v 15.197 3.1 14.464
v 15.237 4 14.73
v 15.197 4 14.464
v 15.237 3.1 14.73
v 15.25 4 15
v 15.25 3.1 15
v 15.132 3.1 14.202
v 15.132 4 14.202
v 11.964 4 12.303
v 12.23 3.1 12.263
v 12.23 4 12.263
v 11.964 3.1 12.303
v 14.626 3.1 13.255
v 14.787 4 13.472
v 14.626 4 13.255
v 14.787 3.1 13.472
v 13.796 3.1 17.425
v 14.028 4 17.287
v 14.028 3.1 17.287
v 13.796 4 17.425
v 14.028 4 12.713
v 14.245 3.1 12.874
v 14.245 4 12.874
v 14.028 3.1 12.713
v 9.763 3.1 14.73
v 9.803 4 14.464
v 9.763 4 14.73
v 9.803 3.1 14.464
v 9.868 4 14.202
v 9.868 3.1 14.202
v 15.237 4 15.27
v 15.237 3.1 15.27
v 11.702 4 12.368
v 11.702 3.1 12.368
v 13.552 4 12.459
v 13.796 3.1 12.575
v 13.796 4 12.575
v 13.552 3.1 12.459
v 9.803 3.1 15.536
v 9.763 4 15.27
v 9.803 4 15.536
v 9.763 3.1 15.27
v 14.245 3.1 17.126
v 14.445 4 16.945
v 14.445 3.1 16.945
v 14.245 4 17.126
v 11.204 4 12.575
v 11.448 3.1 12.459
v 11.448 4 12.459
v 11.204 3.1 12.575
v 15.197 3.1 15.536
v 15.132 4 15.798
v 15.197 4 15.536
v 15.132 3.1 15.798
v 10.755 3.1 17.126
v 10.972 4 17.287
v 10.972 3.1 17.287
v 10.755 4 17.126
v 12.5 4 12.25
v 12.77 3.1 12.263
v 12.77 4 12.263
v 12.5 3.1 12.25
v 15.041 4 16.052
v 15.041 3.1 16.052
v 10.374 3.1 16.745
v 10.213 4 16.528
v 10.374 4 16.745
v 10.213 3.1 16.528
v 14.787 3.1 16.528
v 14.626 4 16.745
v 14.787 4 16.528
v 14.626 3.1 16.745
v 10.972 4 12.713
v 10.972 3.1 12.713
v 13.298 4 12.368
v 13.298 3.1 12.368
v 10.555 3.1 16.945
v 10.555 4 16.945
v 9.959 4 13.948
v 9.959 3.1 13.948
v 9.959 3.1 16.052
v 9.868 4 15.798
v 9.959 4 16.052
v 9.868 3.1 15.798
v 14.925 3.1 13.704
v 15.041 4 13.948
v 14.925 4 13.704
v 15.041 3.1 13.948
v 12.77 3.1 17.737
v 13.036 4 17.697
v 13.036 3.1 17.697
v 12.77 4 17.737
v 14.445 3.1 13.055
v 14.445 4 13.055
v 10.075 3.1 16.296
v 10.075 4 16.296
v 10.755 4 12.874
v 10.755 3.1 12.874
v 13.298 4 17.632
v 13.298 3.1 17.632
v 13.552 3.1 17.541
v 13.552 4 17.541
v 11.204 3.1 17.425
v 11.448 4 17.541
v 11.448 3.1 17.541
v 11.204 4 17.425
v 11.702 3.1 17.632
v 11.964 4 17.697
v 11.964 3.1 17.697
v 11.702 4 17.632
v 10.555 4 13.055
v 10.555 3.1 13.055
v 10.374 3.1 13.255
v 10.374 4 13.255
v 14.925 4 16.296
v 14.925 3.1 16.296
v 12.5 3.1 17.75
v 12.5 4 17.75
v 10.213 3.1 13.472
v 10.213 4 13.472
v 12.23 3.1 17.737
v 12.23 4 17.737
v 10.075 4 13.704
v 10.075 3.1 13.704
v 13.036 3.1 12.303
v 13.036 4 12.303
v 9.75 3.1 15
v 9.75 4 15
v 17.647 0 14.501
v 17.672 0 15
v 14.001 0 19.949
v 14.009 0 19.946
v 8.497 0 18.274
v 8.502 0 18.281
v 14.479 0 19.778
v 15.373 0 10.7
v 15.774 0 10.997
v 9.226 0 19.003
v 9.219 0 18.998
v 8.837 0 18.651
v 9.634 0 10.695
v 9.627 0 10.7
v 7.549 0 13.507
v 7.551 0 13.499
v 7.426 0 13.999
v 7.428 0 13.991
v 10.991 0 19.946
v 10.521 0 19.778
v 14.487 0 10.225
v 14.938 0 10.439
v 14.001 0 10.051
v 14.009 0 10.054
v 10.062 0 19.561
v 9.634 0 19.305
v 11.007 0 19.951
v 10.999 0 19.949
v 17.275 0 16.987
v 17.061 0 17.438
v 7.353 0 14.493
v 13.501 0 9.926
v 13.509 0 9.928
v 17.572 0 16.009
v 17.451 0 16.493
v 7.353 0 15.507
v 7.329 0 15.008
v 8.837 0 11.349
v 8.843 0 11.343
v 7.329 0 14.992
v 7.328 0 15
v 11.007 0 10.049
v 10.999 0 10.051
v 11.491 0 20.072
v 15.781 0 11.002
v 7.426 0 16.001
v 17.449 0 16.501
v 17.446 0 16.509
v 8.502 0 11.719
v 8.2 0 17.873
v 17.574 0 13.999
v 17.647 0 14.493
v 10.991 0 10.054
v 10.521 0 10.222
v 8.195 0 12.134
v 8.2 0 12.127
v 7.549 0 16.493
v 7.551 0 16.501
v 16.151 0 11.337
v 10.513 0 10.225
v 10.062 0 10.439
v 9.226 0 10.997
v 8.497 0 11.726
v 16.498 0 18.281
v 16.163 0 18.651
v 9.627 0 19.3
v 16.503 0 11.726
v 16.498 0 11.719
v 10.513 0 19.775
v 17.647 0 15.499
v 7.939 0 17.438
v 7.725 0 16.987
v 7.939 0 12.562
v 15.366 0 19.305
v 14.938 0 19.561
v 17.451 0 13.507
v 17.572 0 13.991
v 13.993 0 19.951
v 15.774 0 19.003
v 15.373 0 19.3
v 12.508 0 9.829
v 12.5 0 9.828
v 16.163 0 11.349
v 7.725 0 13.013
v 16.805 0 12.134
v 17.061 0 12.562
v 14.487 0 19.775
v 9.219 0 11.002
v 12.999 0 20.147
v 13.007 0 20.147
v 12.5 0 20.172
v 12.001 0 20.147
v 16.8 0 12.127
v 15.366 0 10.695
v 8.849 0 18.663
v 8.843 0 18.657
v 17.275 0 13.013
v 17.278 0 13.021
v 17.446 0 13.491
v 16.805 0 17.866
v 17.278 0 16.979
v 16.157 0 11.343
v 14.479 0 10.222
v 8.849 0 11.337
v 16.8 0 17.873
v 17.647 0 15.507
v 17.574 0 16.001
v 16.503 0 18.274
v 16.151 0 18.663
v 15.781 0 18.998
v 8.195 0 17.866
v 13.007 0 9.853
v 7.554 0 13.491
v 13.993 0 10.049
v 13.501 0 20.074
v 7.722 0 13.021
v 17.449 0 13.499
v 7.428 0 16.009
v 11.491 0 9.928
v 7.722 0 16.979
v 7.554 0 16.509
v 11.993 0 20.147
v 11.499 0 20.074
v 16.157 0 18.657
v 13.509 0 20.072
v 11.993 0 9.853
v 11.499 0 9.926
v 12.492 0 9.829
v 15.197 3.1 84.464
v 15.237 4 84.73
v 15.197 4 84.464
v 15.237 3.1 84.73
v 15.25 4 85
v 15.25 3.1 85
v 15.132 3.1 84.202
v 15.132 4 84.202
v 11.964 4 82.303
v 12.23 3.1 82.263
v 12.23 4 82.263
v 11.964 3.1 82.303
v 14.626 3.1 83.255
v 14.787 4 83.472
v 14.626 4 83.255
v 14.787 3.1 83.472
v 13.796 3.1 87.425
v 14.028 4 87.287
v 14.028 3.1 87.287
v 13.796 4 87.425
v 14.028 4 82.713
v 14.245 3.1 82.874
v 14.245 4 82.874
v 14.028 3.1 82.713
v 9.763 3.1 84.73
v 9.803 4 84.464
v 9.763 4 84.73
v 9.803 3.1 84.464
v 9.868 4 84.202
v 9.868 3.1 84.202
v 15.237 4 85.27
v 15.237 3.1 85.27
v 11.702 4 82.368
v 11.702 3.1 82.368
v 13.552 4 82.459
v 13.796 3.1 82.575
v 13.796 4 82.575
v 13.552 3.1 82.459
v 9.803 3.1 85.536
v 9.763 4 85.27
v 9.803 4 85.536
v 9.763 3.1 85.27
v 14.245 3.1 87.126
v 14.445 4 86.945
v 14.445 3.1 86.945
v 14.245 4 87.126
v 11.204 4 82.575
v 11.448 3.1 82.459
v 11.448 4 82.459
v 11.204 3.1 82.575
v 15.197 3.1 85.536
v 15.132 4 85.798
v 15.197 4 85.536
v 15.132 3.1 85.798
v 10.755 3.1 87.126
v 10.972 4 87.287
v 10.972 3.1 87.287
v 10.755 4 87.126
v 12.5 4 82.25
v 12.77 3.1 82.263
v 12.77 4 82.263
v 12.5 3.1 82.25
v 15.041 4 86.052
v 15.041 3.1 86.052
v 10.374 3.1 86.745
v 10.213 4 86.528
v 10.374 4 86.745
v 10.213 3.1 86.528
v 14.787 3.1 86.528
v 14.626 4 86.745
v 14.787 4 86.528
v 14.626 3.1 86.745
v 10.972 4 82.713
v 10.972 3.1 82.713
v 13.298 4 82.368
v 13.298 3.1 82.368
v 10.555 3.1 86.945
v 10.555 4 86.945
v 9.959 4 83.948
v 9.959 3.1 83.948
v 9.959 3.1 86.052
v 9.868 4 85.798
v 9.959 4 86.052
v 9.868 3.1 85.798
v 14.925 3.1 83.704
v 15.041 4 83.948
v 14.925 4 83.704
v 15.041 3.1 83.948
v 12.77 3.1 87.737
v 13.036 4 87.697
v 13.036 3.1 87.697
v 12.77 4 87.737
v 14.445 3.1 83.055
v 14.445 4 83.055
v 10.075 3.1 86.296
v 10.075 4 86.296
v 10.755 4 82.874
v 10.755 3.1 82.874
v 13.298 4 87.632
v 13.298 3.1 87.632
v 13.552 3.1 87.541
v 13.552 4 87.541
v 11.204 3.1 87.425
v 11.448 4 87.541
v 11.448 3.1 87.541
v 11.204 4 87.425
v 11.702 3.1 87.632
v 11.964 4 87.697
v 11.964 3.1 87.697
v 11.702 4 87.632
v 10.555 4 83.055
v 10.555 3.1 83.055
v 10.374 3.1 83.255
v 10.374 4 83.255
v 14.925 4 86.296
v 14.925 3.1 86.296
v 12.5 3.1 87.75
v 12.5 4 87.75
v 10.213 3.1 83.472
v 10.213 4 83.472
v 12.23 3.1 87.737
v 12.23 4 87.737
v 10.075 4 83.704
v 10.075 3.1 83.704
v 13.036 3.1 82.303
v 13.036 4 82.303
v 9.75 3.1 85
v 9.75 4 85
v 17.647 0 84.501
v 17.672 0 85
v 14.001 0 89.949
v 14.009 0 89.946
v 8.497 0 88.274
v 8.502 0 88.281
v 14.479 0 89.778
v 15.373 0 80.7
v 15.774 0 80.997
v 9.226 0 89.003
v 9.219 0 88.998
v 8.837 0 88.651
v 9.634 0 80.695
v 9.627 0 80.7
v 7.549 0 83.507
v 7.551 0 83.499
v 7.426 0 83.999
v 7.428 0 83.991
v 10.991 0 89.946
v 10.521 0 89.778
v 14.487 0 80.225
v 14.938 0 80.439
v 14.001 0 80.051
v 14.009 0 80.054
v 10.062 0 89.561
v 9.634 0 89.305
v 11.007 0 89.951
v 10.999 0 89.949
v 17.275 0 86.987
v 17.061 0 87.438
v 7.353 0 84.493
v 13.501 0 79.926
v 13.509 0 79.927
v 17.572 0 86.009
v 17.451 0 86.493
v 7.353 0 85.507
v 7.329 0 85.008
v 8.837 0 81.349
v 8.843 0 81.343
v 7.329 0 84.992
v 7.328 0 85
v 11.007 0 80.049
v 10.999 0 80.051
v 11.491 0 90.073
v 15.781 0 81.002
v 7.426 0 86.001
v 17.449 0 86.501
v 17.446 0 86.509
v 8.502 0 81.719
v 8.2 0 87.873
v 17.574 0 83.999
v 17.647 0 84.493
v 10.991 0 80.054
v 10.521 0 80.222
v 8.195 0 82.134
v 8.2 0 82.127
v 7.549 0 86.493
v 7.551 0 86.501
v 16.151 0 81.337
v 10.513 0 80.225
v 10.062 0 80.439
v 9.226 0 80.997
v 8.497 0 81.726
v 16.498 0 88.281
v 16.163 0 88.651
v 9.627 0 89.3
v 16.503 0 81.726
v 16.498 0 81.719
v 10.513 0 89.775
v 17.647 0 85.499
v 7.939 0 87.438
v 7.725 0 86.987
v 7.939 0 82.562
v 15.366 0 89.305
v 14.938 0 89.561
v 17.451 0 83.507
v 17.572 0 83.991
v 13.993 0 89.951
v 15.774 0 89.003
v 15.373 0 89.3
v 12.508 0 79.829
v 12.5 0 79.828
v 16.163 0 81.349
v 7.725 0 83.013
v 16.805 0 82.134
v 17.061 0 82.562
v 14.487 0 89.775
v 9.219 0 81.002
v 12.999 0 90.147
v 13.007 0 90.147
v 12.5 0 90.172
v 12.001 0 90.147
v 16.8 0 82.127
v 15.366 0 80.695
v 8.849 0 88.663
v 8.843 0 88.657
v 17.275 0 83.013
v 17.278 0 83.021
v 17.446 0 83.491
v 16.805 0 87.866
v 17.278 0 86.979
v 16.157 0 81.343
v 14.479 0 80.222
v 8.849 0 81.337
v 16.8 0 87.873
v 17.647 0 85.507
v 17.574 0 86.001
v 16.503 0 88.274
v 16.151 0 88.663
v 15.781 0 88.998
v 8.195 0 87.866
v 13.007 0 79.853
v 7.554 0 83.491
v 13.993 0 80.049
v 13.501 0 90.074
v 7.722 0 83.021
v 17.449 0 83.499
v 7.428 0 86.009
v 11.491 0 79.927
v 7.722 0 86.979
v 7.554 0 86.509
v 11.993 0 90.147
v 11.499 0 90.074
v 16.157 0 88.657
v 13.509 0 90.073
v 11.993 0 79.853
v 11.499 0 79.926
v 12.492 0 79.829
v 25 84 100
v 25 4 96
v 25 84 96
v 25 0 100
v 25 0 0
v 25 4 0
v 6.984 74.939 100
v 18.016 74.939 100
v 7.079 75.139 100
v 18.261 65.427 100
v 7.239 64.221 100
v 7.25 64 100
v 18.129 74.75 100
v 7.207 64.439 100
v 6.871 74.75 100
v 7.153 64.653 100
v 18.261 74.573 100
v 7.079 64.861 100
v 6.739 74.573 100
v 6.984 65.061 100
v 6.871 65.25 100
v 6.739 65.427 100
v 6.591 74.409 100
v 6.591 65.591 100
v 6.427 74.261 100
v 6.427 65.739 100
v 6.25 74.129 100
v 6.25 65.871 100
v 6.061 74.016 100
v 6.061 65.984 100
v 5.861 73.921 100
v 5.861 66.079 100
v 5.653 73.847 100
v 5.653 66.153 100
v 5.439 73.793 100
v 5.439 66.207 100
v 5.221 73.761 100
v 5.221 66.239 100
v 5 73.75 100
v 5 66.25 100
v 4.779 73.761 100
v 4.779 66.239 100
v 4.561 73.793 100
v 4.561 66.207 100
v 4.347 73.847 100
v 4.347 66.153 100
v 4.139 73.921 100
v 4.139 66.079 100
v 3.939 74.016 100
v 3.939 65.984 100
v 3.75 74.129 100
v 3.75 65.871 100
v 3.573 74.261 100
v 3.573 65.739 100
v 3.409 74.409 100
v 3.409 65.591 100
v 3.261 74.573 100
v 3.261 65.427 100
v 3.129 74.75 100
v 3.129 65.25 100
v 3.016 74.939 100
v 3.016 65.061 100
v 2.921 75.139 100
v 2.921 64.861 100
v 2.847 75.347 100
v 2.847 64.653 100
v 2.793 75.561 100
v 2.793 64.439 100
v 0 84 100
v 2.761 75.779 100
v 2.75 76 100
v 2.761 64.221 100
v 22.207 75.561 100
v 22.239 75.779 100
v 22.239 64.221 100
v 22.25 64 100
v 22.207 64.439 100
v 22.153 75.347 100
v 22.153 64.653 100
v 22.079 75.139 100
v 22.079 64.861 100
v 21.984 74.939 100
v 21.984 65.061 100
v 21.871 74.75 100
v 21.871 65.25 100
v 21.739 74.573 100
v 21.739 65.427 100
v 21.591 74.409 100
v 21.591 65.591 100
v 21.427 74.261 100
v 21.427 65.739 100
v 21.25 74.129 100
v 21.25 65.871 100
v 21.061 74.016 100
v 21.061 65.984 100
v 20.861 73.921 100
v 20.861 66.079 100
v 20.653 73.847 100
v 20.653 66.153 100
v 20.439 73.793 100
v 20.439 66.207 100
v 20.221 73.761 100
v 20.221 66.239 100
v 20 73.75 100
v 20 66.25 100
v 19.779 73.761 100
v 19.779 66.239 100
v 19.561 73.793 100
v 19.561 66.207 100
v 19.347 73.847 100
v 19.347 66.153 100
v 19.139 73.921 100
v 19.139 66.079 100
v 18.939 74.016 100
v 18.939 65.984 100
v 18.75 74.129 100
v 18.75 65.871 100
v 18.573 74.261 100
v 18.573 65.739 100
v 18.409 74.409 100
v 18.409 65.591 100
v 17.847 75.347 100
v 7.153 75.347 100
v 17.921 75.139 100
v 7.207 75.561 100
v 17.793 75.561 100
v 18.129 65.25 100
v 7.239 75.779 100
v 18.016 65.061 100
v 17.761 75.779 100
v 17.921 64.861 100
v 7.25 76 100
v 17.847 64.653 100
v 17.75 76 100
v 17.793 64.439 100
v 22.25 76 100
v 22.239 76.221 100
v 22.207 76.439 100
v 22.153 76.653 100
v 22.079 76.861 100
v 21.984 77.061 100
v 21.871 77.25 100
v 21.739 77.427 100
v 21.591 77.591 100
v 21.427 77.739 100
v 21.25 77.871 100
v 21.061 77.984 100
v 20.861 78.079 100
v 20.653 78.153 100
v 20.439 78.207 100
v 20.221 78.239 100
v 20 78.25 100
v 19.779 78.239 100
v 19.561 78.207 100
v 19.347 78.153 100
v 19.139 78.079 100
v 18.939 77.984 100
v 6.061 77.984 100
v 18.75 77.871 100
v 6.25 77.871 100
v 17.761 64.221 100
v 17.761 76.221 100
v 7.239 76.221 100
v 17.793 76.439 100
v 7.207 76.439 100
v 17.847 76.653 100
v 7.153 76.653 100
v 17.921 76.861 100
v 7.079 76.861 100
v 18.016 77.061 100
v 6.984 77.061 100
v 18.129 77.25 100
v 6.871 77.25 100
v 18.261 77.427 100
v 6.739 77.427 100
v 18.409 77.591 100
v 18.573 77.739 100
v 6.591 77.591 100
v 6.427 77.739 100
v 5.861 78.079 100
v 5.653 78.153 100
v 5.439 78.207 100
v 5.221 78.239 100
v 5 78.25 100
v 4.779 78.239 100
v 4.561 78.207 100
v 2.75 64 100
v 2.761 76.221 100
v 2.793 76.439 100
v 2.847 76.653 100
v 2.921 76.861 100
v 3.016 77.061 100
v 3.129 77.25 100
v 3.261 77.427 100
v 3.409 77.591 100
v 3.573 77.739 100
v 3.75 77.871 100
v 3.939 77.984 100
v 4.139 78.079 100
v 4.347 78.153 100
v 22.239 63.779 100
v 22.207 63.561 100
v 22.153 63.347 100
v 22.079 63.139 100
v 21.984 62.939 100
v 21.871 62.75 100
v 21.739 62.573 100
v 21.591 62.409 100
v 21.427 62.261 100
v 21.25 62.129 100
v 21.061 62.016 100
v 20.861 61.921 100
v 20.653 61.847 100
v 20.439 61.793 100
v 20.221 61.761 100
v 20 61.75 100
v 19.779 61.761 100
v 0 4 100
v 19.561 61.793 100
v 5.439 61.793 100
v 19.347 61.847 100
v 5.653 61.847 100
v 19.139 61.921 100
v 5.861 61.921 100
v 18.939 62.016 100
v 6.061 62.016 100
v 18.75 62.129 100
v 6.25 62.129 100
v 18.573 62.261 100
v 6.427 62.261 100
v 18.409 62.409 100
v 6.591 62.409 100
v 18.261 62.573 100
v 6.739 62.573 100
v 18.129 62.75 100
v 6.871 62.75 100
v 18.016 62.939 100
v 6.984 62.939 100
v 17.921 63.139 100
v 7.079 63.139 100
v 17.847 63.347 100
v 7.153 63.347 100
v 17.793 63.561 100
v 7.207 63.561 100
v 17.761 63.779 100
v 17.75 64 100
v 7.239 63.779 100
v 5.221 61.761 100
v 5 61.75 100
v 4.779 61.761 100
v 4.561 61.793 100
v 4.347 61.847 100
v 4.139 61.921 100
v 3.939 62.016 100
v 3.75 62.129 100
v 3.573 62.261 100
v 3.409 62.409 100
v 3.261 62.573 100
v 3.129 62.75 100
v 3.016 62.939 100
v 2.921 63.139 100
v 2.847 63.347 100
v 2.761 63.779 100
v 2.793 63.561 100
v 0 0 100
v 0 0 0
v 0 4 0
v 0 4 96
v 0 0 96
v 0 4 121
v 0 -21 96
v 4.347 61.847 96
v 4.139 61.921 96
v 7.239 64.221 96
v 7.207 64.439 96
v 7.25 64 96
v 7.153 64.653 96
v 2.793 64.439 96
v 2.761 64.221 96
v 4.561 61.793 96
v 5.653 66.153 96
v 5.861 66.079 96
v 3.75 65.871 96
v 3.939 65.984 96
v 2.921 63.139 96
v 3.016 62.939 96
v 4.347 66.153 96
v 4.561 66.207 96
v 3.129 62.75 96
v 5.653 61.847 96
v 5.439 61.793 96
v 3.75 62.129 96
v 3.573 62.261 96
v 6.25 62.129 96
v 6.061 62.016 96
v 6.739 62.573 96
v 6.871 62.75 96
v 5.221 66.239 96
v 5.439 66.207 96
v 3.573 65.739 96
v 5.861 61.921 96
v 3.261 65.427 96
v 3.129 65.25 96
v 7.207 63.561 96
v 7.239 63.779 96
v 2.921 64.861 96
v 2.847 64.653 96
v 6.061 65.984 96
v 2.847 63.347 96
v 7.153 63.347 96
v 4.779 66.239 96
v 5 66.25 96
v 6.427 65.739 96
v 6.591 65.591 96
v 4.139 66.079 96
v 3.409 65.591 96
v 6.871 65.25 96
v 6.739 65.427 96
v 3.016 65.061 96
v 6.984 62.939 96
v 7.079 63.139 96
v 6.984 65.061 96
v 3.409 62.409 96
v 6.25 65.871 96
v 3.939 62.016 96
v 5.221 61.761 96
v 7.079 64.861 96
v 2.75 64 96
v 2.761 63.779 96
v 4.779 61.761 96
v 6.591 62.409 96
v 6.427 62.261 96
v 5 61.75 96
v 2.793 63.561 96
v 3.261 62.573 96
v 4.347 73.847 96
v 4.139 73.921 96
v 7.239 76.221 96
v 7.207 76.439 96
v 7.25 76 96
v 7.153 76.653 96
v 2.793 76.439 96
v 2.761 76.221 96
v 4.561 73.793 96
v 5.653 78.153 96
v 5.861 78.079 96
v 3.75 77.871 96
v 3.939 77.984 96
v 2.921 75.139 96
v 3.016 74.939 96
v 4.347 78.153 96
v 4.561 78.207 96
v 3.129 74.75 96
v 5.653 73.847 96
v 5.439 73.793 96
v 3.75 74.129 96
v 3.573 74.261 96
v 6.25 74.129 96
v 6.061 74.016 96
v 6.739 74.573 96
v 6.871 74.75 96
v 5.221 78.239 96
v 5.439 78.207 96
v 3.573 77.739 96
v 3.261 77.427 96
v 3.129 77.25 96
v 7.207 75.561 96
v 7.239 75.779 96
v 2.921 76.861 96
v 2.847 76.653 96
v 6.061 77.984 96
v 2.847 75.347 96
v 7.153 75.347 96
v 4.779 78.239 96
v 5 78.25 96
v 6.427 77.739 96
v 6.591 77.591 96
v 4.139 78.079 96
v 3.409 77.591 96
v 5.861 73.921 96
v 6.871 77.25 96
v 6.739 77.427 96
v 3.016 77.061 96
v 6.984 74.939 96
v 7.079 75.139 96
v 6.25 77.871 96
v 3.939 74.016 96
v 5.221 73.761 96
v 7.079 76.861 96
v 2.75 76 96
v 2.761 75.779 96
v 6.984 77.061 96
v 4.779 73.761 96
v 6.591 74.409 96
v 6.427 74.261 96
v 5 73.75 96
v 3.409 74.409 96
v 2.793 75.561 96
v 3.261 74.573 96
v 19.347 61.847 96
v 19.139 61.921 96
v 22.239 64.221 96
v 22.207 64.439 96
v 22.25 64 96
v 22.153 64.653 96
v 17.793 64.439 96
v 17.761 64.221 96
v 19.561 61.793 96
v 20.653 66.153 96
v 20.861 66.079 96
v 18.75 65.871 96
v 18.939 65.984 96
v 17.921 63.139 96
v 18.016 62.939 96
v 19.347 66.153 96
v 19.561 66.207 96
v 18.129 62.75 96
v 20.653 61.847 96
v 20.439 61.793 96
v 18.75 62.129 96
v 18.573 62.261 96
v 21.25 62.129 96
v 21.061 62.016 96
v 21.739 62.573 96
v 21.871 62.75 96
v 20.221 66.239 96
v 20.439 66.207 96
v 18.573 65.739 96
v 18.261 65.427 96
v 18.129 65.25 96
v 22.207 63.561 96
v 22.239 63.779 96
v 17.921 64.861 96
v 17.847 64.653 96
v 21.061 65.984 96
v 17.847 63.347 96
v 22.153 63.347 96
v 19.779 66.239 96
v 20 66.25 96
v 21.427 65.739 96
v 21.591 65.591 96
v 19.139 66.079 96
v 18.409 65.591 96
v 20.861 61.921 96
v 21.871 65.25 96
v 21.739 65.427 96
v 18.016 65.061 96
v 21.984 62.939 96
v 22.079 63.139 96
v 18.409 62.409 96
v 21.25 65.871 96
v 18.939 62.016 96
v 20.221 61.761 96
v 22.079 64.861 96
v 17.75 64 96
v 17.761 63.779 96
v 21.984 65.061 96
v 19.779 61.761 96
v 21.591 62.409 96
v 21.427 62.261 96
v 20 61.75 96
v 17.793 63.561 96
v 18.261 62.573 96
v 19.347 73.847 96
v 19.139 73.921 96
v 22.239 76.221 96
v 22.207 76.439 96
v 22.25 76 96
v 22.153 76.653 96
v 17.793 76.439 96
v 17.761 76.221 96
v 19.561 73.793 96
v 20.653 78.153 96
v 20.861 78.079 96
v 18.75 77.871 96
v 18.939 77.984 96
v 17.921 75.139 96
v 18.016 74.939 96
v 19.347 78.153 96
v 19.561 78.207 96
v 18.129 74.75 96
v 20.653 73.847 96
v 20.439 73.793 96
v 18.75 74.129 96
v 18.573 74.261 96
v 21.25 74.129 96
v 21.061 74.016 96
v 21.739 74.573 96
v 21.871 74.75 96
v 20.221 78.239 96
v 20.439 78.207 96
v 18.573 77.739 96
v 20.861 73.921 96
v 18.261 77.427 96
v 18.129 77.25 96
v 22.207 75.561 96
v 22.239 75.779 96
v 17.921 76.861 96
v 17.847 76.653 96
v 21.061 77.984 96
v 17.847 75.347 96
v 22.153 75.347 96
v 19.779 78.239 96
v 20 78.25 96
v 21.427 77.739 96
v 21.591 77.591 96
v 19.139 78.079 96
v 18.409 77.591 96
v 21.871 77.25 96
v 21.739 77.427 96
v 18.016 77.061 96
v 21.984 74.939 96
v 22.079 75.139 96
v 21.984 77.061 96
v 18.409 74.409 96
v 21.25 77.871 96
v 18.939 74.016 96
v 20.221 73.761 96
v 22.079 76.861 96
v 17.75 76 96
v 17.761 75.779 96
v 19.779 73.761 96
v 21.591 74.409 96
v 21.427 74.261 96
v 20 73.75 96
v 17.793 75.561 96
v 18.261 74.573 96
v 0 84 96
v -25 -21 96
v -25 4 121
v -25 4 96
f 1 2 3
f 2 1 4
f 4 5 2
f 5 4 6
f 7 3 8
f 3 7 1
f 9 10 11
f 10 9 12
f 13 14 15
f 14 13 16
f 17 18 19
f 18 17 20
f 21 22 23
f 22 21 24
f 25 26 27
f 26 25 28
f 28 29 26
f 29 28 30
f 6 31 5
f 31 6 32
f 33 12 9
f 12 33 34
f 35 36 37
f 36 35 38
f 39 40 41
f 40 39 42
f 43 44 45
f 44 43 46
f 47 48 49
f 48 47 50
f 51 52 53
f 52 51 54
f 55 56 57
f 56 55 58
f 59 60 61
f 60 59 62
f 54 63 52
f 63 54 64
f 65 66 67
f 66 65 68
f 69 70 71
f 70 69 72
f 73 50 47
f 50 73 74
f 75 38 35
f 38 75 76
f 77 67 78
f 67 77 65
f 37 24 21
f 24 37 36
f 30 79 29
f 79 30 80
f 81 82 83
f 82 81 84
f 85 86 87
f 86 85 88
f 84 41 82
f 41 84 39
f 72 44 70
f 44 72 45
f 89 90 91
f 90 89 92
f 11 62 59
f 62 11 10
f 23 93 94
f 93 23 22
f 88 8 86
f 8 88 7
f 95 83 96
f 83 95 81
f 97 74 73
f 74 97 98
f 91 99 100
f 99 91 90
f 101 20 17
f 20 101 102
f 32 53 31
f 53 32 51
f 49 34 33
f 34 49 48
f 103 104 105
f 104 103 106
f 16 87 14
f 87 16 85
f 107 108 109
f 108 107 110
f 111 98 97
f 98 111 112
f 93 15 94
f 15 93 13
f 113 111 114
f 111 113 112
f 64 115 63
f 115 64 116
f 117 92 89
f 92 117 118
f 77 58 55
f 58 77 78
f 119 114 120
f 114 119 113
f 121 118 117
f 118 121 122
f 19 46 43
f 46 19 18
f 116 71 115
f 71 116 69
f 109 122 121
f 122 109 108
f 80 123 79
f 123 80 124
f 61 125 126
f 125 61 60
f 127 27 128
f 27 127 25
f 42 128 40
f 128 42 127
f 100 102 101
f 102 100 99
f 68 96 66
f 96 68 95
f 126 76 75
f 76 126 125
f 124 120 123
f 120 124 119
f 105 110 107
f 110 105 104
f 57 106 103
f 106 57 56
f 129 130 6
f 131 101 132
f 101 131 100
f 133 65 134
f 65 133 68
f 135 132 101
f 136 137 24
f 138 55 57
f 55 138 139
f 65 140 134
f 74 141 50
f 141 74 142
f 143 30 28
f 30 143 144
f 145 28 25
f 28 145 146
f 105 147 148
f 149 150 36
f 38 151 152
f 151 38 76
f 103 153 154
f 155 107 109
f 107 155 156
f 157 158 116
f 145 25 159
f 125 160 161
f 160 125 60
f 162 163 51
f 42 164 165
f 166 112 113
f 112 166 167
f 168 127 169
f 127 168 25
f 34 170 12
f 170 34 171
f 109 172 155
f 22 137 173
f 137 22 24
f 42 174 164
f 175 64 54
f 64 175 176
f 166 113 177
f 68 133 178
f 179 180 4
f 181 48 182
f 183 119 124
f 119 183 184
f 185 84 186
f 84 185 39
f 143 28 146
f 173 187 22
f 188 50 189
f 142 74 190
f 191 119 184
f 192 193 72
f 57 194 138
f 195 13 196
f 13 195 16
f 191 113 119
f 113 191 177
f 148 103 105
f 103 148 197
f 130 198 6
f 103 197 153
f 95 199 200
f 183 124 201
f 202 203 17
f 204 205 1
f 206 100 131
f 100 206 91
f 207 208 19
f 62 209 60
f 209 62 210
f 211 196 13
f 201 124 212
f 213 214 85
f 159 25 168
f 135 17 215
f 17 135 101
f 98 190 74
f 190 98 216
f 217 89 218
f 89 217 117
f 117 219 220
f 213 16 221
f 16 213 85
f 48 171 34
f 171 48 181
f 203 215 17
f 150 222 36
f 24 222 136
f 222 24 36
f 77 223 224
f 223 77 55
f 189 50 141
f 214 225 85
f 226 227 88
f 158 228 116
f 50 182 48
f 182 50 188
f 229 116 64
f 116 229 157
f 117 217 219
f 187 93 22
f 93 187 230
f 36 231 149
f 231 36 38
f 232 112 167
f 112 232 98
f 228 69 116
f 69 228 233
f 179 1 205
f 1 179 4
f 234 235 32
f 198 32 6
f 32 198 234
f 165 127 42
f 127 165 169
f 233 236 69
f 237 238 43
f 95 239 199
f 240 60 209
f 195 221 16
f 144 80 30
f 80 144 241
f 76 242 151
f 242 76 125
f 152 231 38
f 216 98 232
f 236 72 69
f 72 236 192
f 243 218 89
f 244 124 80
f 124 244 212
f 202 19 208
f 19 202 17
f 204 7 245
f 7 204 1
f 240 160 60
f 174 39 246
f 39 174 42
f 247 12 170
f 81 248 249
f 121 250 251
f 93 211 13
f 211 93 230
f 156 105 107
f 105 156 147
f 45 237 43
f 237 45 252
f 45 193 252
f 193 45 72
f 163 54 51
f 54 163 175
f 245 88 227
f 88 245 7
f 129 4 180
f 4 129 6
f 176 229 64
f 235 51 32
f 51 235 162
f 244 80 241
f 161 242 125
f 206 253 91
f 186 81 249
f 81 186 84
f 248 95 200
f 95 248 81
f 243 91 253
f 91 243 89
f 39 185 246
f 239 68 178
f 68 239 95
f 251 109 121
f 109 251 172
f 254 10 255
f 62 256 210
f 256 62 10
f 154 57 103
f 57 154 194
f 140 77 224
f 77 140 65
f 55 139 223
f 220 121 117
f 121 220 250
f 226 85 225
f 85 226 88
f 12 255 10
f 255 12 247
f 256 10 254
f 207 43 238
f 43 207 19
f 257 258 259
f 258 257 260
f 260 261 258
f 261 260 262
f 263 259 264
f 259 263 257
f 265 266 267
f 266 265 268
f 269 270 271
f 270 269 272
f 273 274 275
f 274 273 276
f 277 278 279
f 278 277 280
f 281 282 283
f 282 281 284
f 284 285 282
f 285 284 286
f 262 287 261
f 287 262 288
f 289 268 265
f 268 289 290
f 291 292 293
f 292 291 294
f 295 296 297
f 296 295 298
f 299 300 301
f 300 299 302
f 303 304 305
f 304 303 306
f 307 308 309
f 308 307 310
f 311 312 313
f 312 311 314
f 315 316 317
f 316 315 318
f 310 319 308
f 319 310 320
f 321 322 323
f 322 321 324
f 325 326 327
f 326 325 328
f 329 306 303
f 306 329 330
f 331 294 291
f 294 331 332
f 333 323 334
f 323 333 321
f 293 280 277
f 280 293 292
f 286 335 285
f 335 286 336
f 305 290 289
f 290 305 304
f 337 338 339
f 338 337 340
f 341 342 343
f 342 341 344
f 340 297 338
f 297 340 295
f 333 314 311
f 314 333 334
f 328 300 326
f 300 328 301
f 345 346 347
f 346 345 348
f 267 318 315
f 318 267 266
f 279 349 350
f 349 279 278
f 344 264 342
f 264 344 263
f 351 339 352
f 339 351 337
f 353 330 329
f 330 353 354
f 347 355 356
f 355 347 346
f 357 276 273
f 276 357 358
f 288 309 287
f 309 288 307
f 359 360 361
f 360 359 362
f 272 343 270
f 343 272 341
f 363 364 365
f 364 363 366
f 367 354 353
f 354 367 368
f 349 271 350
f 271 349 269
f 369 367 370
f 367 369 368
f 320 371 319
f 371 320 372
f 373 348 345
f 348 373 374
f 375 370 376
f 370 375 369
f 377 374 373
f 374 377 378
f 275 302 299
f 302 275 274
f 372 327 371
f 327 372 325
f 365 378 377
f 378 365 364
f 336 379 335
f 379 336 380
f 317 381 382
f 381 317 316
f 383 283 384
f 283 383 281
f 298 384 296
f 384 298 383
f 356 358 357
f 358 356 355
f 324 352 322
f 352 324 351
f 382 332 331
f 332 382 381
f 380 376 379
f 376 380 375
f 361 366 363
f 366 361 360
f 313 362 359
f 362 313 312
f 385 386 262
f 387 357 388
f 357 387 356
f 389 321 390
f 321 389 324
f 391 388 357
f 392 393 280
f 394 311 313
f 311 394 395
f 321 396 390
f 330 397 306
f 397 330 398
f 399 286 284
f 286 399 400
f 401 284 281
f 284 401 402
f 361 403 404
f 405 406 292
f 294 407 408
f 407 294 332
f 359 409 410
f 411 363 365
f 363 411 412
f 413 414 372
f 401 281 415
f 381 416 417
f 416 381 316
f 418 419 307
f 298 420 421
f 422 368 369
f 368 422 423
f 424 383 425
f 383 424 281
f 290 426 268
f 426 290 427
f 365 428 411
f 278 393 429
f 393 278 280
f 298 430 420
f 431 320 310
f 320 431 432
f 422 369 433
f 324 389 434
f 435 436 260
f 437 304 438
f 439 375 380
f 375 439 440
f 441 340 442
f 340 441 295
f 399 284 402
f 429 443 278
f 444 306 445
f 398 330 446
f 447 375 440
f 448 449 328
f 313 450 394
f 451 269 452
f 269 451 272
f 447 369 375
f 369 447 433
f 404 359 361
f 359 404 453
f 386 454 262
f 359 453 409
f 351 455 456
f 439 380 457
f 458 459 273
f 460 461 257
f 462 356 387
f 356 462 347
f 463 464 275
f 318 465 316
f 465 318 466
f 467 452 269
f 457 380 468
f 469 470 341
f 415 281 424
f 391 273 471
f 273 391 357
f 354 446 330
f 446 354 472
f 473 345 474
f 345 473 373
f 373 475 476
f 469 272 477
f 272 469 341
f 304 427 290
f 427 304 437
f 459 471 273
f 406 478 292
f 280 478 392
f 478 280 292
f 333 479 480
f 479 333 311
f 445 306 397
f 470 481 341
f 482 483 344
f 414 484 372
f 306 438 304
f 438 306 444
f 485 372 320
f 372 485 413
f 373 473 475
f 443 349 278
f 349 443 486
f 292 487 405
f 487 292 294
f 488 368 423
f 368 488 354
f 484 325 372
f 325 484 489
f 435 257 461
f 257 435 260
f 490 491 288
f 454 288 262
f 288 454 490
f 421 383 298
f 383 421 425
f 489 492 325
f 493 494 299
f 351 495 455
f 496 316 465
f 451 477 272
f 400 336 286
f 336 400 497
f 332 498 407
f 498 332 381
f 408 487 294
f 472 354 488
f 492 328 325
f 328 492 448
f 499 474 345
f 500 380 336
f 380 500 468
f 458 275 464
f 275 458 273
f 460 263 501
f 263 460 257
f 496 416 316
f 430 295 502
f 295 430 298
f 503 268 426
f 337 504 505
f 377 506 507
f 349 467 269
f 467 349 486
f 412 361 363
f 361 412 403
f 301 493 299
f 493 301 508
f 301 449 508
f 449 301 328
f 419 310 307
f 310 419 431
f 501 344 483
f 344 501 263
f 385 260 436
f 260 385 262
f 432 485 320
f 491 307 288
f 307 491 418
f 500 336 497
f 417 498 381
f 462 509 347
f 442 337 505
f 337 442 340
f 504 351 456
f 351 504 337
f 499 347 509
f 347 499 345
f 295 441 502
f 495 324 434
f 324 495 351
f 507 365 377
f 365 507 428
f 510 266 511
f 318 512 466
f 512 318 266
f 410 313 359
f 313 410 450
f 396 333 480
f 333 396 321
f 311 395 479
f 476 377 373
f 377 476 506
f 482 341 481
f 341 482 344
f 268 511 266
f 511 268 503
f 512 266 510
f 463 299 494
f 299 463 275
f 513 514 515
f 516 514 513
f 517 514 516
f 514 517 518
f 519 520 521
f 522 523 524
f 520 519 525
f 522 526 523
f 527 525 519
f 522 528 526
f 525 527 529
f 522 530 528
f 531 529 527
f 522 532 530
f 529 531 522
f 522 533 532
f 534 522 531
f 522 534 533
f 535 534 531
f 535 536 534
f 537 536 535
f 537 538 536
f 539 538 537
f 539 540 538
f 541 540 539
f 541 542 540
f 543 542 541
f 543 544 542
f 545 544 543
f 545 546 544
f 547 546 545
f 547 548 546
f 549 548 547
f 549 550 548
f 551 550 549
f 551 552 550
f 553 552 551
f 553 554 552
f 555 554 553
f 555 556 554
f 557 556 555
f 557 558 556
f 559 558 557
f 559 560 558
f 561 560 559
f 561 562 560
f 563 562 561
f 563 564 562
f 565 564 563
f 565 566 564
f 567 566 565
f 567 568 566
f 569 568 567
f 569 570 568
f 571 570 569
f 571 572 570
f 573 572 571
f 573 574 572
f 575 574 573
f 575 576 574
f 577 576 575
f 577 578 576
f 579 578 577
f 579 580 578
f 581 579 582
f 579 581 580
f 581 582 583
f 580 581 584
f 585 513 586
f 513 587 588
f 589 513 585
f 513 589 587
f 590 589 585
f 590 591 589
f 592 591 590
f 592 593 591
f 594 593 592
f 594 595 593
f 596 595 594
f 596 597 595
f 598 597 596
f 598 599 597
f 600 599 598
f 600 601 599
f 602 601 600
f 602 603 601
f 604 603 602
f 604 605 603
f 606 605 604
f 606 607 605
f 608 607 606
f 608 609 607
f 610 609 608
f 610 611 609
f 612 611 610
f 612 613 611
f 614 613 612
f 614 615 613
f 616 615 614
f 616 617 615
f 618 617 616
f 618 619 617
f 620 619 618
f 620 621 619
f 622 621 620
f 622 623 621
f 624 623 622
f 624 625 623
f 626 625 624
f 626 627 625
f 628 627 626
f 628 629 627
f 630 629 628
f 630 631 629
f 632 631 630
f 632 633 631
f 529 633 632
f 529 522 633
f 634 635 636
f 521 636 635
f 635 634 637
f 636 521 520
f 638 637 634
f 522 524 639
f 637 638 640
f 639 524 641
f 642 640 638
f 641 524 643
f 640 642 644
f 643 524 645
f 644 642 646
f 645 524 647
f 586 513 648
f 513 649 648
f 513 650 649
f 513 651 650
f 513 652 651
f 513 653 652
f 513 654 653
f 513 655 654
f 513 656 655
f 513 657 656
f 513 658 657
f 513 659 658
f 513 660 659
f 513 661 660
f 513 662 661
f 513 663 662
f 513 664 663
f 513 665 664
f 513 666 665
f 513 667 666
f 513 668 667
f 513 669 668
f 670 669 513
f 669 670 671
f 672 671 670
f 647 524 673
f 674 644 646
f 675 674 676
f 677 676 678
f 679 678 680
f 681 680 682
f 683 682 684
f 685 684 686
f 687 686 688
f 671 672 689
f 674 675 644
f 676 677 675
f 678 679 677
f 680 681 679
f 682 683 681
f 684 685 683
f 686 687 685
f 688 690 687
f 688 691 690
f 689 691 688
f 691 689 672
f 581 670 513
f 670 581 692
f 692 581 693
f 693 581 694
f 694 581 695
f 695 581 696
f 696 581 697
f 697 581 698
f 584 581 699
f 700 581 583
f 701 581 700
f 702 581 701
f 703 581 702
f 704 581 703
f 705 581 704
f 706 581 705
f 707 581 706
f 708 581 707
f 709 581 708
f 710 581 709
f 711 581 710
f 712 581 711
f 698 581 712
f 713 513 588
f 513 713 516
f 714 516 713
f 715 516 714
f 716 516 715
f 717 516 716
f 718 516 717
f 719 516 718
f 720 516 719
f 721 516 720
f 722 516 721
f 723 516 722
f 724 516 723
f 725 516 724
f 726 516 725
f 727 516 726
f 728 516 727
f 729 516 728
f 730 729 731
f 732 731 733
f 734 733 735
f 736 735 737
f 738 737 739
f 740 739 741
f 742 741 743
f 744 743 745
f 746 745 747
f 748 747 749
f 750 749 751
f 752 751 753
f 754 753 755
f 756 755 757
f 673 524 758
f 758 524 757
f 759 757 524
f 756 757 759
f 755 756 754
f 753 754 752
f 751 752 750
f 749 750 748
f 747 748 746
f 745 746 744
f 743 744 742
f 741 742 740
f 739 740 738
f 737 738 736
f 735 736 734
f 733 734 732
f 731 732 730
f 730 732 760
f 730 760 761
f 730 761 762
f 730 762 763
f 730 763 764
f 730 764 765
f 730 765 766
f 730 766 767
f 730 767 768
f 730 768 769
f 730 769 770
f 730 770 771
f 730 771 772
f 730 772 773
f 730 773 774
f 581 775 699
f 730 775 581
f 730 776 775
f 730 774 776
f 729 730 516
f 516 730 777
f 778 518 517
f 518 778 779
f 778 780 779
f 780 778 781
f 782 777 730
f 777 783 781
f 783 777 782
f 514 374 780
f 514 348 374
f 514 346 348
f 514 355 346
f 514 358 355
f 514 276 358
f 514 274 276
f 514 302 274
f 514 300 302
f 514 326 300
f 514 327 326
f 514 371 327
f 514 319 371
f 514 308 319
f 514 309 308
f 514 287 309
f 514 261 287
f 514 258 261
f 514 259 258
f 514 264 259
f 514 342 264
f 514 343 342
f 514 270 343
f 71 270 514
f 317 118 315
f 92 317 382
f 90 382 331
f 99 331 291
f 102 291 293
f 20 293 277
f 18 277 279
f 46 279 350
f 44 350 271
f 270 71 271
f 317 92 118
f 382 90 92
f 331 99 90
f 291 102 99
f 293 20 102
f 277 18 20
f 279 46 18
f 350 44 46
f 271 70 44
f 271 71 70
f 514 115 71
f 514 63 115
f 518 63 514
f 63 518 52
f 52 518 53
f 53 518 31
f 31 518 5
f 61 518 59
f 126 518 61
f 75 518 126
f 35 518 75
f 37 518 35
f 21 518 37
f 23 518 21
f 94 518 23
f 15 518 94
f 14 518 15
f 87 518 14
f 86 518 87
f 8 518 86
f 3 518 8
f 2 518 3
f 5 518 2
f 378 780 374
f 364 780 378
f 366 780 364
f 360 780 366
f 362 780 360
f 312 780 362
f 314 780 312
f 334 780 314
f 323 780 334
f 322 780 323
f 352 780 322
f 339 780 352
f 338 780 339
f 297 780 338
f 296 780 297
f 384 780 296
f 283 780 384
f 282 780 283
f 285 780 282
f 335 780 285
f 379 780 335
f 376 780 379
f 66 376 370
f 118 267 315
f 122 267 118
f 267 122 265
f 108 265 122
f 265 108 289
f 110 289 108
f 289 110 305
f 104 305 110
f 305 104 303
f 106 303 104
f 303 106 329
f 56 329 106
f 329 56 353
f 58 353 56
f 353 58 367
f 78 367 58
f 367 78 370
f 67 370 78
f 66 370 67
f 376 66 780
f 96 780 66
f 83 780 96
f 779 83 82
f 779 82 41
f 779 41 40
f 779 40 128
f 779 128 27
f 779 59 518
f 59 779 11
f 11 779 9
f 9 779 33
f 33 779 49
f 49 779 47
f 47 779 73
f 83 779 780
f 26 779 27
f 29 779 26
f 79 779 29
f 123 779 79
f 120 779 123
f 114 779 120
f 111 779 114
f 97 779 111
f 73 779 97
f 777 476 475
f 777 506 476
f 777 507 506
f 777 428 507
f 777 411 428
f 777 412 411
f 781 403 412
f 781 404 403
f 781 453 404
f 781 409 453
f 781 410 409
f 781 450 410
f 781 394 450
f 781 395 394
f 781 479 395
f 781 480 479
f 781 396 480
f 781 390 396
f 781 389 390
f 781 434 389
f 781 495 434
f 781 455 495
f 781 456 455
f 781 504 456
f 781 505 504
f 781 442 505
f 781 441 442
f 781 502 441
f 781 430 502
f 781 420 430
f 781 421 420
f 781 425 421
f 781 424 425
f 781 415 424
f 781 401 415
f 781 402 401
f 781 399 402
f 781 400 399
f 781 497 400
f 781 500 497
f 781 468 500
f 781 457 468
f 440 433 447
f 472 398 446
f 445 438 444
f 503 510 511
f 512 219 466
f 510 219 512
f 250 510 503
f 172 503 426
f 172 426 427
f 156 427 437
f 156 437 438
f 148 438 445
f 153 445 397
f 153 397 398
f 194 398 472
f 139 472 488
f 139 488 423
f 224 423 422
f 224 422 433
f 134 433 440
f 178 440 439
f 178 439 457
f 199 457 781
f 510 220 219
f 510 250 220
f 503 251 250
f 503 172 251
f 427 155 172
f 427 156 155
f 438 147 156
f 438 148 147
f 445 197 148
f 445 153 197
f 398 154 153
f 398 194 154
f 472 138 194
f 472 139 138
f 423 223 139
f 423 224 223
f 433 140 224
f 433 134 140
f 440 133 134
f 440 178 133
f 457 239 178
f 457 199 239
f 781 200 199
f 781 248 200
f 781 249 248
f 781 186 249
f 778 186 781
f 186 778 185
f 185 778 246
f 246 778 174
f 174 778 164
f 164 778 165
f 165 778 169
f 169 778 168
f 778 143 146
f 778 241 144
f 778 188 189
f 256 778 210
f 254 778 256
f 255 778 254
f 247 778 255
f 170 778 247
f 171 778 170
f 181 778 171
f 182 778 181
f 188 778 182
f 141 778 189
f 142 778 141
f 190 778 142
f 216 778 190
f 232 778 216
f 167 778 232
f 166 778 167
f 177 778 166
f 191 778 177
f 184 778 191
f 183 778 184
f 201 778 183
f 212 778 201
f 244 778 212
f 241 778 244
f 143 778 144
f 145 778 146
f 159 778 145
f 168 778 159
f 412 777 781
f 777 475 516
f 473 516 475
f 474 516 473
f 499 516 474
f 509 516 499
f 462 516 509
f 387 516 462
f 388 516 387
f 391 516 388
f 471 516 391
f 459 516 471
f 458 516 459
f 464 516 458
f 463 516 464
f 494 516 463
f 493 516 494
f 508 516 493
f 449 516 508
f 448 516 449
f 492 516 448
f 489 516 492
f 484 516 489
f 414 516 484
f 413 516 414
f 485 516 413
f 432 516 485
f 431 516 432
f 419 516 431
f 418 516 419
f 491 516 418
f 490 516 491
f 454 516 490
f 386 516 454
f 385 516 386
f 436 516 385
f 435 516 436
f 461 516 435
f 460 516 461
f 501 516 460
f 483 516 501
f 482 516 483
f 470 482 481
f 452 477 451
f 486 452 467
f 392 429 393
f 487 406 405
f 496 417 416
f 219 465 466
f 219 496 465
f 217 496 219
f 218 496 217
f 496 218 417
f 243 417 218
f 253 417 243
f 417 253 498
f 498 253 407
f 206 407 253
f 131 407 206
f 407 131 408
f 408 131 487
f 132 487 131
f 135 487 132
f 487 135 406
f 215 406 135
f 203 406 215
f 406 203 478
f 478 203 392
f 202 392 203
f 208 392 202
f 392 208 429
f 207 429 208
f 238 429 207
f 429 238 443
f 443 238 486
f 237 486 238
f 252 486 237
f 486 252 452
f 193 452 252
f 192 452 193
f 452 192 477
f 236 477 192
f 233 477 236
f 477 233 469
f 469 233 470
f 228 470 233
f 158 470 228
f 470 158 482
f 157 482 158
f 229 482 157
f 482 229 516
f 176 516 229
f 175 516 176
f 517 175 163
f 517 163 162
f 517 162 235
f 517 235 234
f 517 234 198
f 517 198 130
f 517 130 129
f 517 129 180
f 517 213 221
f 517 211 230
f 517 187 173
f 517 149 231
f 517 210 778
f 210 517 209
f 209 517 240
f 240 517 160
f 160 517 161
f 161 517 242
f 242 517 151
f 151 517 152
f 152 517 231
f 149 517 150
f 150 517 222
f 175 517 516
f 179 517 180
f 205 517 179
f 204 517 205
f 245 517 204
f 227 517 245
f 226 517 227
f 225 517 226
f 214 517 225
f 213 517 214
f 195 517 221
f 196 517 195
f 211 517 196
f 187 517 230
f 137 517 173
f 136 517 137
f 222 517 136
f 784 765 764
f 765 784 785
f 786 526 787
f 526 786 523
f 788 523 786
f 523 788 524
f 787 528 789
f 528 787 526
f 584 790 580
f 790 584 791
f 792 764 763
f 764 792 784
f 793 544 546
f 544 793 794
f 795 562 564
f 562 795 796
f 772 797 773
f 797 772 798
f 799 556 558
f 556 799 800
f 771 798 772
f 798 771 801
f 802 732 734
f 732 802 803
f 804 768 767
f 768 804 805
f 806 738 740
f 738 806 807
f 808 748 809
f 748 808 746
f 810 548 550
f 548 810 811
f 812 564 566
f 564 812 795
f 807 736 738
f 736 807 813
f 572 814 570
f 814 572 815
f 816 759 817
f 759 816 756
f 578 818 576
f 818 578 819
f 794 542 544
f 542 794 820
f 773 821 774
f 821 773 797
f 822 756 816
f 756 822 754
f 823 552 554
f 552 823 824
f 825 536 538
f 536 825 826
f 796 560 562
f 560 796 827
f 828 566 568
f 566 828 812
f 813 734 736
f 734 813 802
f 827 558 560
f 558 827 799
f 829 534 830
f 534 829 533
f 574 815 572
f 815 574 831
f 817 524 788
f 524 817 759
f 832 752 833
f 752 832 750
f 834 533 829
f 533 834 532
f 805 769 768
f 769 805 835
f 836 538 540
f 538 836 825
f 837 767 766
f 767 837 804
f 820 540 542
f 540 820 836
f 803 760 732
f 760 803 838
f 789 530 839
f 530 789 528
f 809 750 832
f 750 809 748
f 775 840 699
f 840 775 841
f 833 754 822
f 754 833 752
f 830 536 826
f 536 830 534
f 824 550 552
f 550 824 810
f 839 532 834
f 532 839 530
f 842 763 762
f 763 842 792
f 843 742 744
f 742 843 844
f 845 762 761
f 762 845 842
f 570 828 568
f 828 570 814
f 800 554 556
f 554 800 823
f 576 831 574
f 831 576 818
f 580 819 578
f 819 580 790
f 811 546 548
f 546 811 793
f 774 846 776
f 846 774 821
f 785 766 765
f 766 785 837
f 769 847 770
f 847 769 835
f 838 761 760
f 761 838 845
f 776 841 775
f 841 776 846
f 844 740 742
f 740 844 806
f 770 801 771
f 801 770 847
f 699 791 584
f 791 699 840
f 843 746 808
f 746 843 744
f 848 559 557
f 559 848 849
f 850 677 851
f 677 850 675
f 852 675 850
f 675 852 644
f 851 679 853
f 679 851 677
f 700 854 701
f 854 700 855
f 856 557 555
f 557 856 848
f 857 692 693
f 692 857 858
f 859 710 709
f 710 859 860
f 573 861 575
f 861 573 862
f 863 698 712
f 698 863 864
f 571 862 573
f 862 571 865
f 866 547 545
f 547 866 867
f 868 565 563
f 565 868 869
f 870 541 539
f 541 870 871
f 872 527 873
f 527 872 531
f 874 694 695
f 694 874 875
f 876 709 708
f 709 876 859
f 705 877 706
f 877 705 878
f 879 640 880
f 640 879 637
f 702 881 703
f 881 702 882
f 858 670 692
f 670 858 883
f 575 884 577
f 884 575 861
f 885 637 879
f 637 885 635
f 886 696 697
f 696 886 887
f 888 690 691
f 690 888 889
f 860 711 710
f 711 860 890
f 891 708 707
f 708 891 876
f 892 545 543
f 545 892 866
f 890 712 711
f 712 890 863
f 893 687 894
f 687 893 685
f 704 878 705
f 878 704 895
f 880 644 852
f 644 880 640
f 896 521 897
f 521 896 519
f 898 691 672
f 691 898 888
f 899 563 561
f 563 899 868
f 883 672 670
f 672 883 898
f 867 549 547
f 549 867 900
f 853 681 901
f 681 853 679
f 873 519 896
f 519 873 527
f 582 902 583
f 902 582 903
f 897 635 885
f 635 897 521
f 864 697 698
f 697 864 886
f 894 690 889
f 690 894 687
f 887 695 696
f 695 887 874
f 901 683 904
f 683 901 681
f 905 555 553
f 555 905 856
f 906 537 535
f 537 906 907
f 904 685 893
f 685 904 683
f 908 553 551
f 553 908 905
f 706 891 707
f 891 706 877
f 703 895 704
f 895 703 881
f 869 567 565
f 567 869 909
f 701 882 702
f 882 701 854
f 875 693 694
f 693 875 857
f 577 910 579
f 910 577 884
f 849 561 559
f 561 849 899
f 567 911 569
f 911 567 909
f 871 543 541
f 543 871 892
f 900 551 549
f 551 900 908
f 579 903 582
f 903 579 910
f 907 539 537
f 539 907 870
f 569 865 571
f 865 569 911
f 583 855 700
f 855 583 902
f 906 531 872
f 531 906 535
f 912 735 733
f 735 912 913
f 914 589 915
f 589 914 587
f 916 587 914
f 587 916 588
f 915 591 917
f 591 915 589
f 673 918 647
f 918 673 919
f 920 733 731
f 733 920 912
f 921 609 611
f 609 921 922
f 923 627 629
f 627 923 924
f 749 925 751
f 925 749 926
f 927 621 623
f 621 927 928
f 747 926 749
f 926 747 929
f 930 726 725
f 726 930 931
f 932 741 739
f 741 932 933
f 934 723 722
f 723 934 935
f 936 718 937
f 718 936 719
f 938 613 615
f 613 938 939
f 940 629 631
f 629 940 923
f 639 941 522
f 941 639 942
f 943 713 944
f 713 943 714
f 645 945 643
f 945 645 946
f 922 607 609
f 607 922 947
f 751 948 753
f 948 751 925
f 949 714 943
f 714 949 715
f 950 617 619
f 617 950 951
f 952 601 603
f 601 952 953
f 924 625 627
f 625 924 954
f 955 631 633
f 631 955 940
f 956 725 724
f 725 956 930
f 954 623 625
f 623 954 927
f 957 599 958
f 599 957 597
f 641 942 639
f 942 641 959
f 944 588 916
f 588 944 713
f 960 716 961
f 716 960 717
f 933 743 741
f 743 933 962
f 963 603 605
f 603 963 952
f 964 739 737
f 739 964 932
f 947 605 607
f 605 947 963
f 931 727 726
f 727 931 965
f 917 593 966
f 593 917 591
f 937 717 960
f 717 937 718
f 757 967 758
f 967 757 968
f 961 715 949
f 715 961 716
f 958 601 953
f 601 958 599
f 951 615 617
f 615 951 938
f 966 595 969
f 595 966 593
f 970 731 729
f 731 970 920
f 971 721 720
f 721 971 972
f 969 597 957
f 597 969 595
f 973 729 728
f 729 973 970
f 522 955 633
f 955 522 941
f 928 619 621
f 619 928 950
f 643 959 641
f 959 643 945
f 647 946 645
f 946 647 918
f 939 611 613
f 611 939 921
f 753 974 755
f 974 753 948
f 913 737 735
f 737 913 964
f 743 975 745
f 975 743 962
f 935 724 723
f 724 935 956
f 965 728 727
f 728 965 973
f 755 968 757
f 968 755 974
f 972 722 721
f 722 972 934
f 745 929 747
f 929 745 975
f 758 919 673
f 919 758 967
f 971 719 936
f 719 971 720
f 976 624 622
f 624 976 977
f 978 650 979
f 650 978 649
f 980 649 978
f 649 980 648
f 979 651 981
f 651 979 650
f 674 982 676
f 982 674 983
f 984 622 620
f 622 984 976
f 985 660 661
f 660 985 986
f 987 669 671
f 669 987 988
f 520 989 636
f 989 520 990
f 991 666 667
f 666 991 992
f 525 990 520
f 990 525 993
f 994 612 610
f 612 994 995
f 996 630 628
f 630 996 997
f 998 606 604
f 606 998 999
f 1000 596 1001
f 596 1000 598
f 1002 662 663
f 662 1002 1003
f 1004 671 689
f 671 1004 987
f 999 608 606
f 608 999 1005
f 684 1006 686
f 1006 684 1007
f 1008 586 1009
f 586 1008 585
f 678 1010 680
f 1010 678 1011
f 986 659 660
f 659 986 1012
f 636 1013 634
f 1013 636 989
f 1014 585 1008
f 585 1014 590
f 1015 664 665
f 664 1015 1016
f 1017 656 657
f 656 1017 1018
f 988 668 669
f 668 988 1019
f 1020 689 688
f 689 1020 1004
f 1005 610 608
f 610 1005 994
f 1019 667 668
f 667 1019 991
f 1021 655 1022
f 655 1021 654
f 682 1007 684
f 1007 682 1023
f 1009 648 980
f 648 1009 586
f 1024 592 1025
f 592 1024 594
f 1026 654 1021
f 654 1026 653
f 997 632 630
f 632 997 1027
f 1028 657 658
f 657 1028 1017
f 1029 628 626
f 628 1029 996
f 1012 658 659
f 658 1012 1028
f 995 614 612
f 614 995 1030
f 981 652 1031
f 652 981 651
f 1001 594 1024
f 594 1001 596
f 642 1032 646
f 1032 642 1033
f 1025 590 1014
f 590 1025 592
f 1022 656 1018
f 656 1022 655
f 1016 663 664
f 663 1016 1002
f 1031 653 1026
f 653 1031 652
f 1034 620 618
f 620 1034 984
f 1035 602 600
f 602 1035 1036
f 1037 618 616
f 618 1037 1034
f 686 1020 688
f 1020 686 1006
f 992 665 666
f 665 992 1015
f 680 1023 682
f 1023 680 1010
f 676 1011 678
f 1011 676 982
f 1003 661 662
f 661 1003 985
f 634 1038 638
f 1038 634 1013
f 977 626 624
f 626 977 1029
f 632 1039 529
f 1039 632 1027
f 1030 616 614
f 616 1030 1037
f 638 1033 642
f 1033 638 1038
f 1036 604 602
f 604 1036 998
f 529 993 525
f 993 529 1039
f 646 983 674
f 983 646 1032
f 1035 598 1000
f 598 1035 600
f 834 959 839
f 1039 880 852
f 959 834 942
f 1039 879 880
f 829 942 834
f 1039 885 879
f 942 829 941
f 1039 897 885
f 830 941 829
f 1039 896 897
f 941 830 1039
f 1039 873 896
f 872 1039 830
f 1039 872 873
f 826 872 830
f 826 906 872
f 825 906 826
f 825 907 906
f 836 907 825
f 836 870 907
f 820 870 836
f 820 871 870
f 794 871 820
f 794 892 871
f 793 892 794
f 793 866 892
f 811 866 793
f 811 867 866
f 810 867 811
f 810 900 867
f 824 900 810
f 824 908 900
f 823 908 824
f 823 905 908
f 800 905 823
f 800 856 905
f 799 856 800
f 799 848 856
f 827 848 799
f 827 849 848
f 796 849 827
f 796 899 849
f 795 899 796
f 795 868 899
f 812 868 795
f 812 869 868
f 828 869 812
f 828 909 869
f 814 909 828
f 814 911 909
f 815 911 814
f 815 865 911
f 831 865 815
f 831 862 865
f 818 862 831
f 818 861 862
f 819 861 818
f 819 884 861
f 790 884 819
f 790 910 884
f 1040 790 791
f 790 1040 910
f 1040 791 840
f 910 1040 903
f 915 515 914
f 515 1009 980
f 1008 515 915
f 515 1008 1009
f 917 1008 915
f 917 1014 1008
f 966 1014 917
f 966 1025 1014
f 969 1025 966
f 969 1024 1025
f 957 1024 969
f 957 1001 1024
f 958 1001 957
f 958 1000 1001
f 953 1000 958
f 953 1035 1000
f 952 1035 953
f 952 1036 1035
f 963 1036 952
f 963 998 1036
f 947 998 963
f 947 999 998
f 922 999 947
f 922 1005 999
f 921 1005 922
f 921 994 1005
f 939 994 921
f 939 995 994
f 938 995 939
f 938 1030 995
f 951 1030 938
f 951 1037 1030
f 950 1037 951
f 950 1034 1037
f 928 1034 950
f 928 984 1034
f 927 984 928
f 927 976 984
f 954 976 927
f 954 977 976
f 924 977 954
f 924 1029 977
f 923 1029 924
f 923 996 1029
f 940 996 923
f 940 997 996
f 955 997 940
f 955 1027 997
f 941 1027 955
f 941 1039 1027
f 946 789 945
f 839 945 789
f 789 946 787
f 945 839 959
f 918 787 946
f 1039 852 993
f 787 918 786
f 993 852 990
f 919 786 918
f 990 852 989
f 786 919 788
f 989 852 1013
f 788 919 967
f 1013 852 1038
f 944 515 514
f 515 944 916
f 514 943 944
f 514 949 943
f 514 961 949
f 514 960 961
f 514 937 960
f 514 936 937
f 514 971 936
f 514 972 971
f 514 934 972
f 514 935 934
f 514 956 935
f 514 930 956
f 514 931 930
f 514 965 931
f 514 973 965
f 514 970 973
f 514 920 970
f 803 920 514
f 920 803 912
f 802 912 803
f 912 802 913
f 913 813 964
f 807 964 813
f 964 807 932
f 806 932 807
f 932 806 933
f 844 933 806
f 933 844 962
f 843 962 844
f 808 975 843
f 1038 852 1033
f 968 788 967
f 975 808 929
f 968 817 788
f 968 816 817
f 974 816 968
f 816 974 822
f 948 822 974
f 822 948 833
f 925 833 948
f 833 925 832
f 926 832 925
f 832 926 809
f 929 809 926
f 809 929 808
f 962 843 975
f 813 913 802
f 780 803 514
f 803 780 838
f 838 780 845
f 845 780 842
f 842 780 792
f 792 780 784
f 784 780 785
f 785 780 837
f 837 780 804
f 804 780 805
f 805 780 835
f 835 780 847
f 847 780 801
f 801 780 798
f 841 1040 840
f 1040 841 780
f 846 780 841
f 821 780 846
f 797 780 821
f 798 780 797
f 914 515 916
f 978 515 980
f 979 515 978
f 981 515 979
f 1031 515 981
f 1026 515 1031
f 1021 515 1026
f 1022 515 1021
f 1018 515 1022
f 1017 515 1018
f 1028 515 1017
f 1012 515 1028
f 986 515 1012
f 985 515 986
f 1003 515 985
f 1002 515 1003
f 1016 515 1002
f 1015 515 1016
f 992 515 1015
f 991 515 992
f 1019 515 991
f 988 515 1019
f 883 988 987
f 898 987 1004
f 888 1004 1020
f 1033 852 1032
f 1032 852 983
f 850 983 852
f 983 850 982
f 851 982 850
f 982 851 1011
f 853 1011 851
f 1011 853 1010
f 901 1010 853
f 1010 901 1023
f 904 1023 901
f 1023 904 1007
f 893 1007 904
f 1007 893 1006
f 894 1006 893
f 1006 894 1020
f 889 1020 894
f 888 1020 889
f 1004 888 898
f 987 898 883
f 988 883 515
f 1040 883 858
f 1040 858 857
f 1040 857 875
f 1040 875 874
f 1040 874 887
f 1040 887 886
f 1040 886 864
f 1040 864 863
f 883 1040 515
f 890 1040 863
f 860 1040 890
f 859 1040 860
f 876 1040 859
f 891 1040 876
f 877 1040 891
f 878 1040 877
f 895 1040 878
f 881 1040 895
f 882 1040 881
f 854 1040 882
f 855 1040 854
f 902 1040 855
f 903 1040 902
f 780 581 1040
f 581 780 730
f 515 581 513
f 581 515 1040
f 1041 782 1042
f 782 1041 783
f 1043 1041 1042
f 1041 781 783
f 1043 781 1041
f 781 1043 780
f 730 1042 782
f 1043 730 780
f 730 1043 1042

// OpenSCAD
// ═══════════════════════════════════════════════════════════════════════════
//  Solar Bracket  —  standalone part file
//  L-shaped wall arm for mounting a 6V/10W solar panel.
//
//  Geometry:
//    Vertical wall plate  25 × 4 × 100 mm   — screws to wall (2× M5)
//    Horizontal arm       25 × 80 × 4 mm    — panel rests on top
//    Triangular gusset                       — prevents arm from drooping
//    Panel mounting holes  4× M4 at arm end — bolts through panel frame
//
//  Open in OpenSCAD → F6 → File → Export → STL
//  Print in PETG (preferred for UV/outdoor) at 0.2 mm layers,
//  4 perimeters, 40 % gyroid infill. No supports needed.
// ═══════════════════════════════════════════════════════════════════════════

ARM_L   = 80;    // horizontal arm length (mm)
ARM_W   = 25;    // arm + plate width     (mm)
ARM_TH  =  4;    // arm + plate thickness (mm)
PLATE_H = 100;   // vertical plate height (mm)

$fn = 64;

module solar_bracket() {
    // ── Vertical wall plate ──────────────────────────────────────────────
    difference() {
        cube([ARM_W, ARM_TH, PLATE_H]);
        // 2× M5 wall-screw holes (⌀5.5), countersunk on the back face
        for (z = [15, PLATE_H - 15]) {
            translate([ARM_W/2, -1, z])
                rotate([-90, 0, 0])
                    cylinder(d=5.5, h=ARM_TH + 2);
            translate([ARM_W/2, -0.1, z])
                rotate([-90, 0, 0])
                    cylinder(d1=10.5, d2=5.5, h=3.2);   // 90° countersink
        }
    }

    // ── Horizontal arm (extends outward from top of plate) ───────────────
    translate([0, ARM_TH, PLATE_H - ARM_TH])
        difference() {
            cube([ARM_W, ARM_L, ARM_TH]);
            // 4× M4 panel mounting holes (⌀4.5) near the far end of arm
            for (xp = [5, ARM_W - 5], yp = [ARM_L - 20, ARM_L - 8])
                translate([xp, yp, -1])
                    cylinder(d=4.5, h=ARM_TH + 2);
        }

    // ── Triangular gusset (joins underside of arm to plate) ─────────────
    translate([0, ARM_TH, PLATE_H - ARM_TH])
        rotate([0, -90, 0])
            linear_extrude(ARM_W)
                polygon([[0, 0], [25, 0], [0, -25]]);
}

solar_bracket();
